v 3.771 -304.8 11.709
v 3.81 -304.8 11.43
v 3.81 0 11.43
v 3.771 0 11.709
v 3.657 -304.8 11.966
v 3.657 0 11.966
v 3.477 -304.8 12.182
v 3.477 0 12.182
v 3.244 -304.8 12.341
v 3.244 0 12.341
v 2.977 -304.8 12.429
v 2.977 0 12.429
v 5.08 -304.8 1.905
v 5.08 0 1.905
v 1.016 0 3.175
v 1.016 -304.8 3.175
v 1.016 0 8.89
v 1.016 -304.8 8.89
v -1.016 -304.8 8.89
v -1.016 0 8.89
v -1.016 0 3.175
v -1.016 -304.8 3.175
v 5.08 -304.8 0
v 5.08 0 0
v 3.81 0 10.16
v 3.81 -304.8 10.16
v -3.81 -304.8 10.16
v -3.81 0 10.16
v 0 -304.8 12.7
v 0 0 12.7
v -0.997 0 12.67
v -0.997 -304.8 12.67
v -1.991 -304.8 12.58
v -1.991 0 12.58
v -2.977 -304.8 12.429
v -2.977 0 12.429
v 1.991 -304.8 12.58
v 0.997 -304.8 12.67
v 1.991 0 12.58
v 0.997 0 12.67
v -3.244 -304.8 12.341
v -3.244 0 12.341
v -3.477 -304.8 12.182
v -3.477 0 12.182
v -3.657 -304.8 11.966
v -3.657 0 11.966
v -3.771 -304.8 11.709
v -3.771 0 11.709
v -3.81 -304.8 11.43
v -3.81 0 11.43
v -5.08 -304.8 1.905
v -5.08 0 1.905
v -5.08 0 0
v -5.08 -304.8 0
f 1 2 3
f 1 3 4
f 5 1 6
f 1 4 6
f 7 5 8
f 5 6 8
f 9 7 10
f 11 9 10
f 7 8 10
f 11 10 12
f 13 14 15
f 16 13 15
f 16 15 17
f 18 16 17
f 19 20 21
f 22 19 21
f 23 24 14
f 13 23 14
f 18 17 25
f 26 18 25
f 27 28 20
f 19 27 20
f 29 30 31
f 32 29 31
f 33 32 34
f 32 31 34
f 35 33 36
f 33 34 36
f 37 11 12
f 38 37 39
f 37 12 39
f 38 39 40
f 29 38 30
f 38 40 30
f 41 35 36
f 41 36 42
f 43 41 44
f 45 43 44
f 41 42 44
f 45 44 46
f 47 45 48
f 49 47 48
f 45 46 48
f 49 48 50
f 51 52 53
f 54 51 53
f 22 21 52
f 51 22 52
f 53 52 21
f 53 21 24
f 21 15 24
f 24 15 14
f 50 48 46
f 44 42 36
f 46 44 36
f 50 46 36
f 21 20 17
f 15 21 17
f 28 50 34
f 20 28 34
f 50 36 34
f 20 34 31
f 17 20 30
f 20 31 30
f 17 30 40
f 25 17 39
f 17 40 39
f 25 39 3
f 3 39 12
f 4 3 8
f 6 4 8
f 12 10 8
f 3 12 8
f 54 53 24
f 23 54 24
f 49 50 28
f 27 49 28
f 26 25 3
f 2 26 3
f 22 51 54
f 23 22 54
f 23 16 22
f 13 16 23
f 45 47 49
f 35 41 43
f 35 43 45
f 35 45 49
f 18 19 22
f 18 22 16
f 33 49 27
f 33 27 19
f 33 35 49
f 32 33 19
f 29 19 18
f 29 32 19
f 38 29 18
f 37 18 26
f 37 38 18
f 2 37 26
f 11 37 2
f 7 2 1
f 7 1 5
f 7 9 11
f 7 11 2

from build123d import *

# Parameters (mm, degrees)
F1_DEPTH = 304.8


with BuildPart() as f1:
    # F0 (on Front) → F1 (new body)
    with BuildSketch(Plane.XZ):
        with BuildLine():
            Line((-5.08, 0), (0, 0))
            Line((0, 0), (5.08, 0))
            Line((5.08, 0), (5.08, 1.905))
            Line((5.08, 1.905), (1.016, 3.175))
            Line((1.016, 3.175), (1.016, 8.89))
            Line((1.016, 8.89), (3.81, 10.16))
            Line((3.81, 10.16), (3.81, 11.43))
            ThreePointArc((3.81, 11.43), (3.574513, 12.080427), (2.977213, 12.429344))
            ThreePointArc((2.977213, 12.429344), (1.494745, 12.632197), (0, 12.7))
            ThreePointArc((0, 12.7), (-1.494745, 12.632197), (-2.977213, 12.429344))
            ThreePointArc((-2.977213, 12.429344), (-3.574513, 12.080427), (-3.81, 11.43))
            Line((-3.81, 11.43), (-3.81, 10.16))
            Line((-3.81, 10.16), (-1.016, 8.89))
            Line((-1.016, 8.89), (-1.016, 3.175))
            Line((-1.016, 3.175), (-5.08, 1.905))
            Line((-5.08, 1.905), (-5.08, 0))
        make_face()
    extrude(amount=F1_DEPTH)


solid = f1.part
